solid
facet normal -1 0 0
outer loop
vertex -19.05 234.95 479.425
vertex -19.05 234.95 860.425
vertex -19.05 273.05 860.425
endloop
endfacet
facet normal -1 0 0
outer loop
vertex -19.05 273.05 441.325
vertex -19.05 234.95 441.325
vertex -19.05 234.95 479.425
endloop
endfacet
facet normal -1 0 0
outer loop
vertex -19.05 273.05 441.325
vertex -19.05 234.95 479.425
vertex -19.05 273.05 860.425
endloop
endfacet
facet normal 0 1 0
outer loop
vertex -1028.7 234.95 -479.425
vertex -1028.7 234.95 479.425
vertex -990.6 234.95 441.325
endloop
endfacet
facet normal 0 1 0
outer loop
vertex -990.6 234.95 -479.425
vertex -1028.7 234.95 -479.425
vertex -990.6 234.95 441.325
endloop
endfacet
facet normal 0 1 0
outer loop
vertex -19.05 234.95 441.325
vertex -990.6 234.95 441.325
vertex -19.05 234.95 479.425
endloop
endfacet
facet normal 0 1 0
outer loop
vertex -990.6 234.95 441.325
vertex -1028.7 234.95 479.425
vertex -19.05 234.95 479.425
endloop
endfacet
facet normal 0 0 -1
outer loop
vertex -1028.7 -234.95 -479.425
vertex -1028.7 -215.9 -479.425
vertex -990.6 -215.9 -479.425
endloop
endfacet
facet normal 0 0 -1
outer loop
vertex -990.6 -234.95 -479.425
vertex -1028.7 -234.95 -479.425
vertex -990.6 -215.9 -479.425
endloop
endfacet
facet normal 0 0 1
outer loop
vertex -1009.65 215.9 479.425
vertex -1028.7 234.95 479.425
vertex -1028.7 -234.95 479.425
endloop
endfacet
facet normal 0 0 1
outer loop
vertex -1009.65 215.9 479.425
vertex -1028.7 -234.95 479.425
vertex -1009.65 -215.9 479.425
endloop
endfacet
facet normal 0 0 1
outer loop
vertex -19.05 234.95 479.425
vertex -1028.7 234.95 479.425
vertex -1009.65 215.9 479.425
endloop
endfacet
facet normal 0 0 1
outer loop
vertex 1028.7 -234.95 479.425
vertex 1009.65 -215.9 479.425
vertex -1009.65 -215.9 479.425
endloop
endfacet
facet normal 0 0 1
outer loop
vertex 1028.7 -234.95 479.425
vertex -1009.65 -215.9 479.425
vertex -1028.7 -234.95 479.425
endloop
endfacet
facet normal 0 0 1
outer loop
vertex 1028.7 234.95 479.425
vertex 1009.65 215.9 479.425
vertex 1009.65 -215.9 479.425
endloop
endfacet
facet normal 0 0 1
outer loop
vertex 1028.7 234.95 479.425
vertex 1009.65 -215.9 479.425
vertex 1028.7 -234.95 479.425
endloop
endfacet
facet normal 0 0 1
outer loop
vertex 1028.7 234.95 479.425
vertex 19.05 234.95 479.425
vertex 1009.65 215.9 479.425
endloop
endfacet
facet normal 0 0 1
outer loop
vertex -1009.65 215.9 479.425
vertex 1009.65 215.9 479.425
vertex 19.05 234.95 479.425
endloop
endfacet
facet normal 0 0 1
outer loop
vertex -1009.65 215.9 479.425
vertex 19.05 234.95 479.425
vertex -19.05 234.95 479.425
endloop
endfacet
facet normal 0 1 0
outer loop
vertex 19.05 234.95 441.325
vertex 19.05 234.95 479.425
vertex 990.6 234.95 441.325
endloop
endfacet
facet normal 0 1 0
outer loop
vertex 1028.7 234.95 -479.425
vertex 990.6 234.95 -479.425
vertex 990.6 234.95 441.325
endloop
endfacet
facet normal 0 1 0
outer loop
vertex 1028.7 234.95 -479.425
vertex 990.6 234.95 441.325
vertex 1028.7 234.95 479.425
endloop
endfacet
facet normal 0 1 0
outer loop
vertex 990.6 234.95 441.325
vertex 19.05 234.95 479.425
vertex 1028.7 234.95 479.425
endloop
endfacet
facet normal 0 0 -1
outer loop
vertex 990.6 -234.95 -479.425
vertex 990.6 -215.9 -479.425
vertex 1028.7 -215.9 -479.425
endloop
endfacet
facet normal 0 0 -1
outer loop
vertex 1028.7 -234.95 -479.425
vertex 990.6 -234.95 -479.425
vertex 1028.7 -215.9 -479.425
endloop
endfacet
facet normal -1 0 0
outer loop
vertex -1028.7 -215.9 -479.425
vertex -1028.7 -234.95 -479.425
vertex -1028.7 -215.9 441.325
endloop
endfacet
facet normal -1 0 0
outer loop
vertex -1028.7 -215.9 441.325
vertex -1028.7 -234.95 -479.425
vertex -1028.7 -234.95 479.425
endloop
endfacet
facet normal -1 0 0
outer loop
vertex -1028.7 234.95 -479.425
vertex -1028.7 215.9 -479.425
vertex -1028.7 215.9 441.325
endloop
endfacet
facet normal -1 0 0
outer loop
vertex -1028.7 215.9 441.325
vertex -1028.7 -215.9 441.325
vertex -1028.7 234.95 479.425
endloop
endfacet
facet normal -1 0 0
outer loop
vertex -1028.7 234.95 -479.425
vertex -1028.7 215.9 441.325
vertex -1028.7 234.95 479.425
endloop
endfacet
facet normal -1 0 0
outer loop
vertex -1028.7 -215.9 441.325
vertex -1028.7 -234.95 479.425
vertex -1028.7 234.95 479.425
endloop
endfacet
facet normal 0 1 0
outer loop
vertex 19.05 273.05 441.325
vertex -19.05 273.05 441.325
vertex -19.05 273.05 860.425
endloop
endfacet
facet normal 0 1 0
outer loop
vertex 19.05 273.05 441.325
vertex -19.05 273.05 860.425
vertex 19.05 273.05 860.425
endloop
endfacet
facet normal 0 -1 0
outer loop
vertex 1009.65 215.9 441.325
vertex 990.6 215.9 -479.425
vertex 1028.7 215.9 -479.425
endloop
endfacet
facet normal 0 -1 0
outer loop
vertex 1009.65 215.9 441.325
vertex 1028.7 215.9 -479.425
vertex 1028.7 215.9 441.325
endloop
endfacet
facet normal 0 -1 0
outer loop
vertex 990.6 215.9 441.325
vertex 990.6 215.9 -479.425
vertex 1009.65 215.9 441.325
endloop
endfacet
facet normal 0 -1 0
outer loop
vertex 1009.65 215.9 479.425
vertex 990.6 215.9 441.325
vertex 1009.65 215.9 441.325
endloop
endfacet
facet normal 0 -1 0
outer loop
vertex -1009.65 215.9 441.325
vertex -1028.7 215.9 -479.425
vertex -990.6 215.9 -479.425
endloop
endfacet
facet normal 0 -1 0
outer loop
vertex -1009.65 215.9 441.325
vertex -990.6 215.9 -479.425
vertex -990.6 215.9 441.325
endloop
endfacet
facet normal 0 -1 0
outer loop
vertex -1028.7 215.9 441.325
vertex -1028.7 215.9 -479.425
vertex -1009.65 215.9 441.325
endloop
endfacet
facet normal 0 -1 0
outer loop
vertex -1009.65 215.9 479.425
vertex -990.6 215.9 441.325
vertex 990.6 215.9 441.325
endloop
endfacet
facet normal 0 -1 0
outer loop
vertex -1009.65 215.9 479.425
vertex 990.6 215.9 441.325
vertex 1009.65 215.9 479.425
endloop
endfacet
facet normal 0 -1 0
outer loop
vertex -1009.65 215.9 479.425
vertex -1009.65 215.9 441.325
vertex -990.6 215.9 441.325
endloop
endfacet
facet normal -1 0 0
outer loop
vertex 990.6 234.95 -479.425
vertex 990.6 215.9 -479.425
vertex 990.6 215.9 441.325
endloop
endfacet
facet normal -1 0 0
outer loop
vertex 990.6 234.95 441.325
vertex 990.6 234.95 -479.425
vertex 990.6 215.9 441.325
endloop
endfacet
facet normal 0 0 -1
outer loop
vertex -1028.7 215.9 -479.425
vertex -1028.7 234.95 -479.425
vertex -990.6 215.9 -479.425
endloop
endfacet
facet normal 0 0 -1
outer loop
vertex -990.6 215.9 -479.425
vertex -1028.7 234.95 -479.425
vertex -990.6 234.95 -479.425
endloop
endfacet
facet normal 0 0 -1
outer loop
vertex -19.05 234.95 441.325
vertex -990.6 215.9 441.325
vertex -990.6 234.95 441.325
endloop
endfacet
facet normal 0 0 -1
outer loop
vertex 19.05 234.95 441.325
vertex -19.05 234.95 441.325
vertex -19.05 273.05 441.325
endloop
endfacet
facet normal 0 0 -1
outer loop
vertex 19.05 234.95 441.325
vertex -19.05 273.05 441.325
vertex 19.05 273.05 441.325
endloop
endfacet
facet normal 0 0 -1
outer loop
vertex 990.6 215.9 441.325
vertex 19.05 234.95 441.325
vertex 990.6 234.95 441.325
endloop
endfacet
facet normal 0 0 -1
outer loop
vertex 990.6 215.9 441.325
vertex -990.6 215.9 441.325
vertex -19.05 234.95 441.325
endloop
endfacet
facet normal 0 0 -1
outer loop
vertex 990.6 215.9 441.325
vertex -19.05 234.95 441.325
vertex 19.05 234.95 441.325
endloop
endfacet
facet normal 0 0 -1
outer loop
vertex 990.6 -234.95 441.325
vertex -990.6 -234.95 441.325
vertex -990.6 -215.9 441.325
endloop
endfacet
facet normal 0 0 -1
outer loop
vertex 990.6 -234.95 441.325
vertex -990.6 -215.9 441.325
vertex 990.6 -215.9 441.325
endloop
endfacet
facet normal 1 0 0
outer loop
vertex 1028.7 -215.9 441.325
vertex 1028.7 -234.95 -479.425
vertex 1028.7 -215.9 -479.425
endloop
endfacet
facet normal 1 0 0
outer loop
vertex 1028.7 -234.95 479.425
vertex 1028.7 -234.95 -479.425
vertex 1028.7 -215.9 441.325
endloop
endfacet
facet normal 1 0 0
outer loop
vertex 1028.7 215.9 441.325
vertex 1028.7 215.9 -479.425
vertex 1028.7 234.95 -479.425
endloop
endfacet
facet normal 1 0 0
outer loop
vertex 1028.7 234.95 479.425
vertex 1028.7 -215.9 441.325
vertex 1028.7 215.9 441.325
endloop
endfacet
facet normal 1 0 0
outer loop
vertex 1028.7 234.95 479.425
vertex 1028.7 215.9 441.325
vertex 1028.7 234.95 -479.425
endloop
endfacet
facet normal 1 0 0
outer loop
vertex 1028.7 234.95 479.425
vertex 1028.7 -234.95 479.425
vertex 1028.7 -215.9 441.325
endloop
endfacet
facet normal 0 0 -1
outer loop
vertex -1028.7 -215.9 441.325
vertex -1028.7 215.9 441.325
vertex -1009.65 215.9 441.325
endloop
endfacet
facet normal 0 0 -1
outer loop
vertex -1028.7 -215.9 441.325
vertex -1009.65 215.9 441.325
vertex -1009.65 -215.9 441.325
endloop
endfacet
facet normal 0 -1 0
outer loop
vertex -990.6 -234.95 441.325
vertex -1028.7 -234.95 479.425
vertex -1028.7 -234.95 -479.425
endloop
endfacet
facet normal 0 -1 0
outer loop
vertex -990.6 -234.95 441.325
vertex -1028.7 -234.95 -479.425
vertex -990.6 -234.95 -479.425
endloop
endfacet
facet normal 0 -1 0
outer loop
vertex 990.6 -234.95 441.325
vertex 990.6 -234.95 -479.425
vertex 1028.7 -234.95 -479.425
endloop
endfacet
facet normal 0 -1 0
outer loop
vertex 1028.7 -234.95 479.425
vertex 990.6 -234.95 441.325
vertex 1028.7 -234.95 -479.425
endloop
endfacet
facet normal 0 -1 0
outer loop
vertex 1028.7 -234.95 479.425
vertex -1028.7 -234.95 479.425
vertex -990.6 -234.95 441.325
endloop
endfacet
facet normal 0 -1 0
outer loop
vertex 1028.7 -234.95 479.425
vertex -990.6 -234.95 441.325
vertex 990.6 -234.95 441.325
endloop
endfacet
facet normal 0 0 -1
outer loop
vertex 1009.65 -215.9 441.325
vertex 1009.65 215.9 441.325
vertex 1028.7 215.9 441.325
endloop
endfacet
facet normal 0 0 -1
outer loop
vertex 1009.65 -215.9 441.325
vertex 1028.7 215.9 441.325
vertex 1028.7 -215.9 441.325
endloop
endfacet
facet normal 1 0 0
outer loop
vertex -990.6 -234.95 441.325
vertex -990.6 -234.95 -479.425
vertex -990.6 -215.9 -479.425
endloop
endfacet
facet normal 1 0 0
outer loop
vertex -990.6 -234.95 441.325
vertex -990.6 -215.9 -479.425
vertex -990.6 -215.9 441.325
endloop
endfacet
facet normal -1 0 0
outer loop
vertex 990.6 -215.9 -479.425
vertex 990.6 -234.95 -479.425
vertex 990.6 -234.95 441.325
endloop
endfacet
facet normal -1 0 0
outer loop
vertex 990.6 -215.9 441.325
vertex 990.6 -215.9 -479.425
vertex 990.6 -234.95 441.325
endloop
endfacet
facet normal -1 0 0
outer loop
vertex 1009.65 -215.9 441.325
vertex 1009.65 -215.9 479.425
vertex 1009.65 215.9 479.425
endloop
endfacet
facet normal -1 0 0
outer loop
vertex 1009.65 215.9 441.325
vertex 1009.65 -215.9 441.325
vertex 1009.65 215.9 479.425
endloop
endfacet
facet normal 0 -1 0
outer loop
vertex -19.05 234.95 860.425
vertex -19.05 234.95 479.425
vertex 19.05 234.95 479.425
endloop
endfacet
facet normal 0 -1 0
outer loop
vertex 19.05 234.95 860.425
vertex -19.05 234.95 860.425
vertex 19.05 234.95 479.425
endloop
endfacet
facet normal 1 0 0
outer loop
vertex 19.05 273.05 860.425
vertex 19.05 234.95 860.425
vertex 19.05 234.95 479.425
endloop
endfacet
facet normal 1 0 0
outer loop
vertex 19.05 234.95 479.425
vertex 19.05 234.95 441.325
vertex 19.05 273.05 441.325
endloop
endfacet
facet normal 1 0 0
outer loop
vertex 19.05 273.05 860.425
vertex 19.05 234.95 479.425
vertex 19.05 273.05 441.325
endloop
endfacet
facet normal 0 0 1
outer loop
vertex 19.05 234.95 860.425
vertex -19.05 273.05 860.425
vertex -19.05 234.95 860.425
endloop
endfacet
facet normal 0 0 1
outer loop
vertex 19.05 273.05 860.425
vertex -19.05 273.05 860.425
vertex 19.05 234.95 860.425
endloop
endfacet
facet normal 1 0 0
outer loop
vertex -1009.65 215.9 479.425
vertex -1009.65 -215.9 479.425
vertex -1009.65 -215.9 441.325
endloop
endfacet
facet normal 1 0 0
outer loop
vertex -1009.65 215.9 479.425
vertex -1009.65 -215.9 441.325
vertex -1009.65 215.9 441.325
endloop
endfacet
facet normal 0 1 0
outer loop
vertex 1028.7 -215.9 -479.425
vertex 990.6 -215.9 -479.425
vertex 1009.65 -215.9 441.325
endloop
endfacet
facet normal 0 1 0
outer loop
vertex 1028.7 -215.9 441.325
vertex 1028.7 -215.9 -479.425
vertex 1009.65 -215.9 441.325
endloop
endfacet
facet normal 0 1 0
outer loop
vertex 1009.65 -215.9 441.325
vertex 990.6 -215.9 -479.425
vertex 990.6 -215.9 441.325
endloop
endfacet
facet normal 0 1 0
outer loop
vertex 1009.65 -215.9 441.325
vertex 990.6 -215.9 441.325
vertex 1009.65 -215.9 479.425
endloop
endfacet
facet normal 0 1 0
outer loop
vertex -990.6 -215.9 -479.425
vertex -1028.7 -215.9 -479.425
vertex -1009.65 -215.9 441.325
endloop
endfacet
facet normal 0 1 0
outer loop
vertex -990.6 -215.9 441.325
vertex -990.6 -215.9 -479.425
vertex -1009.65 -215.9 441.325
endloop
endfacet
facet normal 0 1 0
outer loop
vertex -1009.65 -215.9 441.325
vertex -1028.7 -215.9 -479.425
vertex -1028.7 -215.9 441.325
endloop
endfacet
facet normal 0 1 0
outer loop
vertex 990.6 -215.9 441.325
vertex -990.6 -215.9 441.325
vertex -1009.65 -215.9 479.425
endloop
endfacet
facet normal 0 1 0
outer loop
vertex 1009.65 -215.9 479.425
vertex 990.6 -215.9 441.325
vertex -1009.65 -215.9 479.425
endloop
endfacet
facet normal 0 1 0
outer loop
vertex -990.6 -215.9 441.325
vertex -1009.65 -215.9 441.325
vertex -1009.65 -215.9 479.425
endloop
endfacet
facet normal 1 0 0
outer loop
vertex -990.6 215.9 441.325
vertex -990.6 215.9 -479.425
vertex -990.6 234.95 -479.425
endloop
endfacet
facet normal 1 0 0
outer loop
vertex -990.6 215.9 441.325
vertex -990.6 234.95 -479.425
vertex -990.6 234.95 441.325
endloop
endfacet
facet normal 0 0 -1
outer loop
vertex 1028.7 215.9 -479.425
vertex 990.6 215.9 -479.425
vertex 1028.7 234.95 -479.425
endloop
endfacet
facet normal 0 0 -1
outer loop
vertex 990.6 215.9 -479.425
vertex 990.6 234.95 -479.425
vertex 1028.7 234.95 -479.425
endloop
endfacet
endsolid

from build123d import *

# Parameters (mm, degrees)
F0_W     = 2057.4
F0_H     = 469.9
F0_W_2   = 2019.3
F0_H_2   = 431.8
F1_DEPTH = 479.425
F2_W     = 1981.2
F2_H     = 920.75
F3_DEPTH = 469.901
F4_W     = 431.8
F4_H     = 920.75
F5_DEPTH = 2057.401
F6_W     = 38.1
F6_H     = 38.1
F7_DEPTH = 38.1
F8_W     = 38.1
F8_H     = 38.1
F9_DEPTH = 381


with BuildPart() as f1:
    # F0 (on Top) → F1 (new body, symmetric)
    with BuildSketch(Plane.XY):
        Rectangle(F0_W, F0_H)
        Rectangle(F0_W_2, F0_H_2, mode=Mode.SUBTRACT)
    extrude(amount=F1_DEPTH, both=True)

    # F2 (on face) → F3 (cut, through all)
    with BuildSketch(Plane.XZ.offset(234.95)):
        with Locations((0, -19.05)):
            Rectangle(F2_W, F2_H)
    extrude(amount=-F3_DEPTH, mode=Mode.SUBTRACT)

    # F4 (on face) → F5 (cut, through all)
    with BuildSketch(Plane(origin=(-1028.7, 0, 0), x_dir=(0, -1, 0), z_dir=(-1, 0, 0))):
        with Locations((0, -19.05)):
            Rectangle(F4_W, F4_H)
    extrude(amount=-F5_DEPTH, mode=Mode.SUBTRACT)

    # F6 (on face) → F7 (join)
    with BuildSketch(Plane(origin=(0, 234.95, 0), x_dir=(-1, 0, 0), z_dir=(0, 1, 0))):
        with Locations((0, 460.375)):
            Rectangle(F6_W, F6_H)
    extrude(amount=F7_DEPTH)

    # F8 (on face) → F9 (join)
    with BuildSketch(Plane.XY.offset(479.425)):
        with Locations((0, 254)):
            Rectangle(F8_W, F8_H)
    extrude(amount=F9_DEPTH)


solid = f1.part
